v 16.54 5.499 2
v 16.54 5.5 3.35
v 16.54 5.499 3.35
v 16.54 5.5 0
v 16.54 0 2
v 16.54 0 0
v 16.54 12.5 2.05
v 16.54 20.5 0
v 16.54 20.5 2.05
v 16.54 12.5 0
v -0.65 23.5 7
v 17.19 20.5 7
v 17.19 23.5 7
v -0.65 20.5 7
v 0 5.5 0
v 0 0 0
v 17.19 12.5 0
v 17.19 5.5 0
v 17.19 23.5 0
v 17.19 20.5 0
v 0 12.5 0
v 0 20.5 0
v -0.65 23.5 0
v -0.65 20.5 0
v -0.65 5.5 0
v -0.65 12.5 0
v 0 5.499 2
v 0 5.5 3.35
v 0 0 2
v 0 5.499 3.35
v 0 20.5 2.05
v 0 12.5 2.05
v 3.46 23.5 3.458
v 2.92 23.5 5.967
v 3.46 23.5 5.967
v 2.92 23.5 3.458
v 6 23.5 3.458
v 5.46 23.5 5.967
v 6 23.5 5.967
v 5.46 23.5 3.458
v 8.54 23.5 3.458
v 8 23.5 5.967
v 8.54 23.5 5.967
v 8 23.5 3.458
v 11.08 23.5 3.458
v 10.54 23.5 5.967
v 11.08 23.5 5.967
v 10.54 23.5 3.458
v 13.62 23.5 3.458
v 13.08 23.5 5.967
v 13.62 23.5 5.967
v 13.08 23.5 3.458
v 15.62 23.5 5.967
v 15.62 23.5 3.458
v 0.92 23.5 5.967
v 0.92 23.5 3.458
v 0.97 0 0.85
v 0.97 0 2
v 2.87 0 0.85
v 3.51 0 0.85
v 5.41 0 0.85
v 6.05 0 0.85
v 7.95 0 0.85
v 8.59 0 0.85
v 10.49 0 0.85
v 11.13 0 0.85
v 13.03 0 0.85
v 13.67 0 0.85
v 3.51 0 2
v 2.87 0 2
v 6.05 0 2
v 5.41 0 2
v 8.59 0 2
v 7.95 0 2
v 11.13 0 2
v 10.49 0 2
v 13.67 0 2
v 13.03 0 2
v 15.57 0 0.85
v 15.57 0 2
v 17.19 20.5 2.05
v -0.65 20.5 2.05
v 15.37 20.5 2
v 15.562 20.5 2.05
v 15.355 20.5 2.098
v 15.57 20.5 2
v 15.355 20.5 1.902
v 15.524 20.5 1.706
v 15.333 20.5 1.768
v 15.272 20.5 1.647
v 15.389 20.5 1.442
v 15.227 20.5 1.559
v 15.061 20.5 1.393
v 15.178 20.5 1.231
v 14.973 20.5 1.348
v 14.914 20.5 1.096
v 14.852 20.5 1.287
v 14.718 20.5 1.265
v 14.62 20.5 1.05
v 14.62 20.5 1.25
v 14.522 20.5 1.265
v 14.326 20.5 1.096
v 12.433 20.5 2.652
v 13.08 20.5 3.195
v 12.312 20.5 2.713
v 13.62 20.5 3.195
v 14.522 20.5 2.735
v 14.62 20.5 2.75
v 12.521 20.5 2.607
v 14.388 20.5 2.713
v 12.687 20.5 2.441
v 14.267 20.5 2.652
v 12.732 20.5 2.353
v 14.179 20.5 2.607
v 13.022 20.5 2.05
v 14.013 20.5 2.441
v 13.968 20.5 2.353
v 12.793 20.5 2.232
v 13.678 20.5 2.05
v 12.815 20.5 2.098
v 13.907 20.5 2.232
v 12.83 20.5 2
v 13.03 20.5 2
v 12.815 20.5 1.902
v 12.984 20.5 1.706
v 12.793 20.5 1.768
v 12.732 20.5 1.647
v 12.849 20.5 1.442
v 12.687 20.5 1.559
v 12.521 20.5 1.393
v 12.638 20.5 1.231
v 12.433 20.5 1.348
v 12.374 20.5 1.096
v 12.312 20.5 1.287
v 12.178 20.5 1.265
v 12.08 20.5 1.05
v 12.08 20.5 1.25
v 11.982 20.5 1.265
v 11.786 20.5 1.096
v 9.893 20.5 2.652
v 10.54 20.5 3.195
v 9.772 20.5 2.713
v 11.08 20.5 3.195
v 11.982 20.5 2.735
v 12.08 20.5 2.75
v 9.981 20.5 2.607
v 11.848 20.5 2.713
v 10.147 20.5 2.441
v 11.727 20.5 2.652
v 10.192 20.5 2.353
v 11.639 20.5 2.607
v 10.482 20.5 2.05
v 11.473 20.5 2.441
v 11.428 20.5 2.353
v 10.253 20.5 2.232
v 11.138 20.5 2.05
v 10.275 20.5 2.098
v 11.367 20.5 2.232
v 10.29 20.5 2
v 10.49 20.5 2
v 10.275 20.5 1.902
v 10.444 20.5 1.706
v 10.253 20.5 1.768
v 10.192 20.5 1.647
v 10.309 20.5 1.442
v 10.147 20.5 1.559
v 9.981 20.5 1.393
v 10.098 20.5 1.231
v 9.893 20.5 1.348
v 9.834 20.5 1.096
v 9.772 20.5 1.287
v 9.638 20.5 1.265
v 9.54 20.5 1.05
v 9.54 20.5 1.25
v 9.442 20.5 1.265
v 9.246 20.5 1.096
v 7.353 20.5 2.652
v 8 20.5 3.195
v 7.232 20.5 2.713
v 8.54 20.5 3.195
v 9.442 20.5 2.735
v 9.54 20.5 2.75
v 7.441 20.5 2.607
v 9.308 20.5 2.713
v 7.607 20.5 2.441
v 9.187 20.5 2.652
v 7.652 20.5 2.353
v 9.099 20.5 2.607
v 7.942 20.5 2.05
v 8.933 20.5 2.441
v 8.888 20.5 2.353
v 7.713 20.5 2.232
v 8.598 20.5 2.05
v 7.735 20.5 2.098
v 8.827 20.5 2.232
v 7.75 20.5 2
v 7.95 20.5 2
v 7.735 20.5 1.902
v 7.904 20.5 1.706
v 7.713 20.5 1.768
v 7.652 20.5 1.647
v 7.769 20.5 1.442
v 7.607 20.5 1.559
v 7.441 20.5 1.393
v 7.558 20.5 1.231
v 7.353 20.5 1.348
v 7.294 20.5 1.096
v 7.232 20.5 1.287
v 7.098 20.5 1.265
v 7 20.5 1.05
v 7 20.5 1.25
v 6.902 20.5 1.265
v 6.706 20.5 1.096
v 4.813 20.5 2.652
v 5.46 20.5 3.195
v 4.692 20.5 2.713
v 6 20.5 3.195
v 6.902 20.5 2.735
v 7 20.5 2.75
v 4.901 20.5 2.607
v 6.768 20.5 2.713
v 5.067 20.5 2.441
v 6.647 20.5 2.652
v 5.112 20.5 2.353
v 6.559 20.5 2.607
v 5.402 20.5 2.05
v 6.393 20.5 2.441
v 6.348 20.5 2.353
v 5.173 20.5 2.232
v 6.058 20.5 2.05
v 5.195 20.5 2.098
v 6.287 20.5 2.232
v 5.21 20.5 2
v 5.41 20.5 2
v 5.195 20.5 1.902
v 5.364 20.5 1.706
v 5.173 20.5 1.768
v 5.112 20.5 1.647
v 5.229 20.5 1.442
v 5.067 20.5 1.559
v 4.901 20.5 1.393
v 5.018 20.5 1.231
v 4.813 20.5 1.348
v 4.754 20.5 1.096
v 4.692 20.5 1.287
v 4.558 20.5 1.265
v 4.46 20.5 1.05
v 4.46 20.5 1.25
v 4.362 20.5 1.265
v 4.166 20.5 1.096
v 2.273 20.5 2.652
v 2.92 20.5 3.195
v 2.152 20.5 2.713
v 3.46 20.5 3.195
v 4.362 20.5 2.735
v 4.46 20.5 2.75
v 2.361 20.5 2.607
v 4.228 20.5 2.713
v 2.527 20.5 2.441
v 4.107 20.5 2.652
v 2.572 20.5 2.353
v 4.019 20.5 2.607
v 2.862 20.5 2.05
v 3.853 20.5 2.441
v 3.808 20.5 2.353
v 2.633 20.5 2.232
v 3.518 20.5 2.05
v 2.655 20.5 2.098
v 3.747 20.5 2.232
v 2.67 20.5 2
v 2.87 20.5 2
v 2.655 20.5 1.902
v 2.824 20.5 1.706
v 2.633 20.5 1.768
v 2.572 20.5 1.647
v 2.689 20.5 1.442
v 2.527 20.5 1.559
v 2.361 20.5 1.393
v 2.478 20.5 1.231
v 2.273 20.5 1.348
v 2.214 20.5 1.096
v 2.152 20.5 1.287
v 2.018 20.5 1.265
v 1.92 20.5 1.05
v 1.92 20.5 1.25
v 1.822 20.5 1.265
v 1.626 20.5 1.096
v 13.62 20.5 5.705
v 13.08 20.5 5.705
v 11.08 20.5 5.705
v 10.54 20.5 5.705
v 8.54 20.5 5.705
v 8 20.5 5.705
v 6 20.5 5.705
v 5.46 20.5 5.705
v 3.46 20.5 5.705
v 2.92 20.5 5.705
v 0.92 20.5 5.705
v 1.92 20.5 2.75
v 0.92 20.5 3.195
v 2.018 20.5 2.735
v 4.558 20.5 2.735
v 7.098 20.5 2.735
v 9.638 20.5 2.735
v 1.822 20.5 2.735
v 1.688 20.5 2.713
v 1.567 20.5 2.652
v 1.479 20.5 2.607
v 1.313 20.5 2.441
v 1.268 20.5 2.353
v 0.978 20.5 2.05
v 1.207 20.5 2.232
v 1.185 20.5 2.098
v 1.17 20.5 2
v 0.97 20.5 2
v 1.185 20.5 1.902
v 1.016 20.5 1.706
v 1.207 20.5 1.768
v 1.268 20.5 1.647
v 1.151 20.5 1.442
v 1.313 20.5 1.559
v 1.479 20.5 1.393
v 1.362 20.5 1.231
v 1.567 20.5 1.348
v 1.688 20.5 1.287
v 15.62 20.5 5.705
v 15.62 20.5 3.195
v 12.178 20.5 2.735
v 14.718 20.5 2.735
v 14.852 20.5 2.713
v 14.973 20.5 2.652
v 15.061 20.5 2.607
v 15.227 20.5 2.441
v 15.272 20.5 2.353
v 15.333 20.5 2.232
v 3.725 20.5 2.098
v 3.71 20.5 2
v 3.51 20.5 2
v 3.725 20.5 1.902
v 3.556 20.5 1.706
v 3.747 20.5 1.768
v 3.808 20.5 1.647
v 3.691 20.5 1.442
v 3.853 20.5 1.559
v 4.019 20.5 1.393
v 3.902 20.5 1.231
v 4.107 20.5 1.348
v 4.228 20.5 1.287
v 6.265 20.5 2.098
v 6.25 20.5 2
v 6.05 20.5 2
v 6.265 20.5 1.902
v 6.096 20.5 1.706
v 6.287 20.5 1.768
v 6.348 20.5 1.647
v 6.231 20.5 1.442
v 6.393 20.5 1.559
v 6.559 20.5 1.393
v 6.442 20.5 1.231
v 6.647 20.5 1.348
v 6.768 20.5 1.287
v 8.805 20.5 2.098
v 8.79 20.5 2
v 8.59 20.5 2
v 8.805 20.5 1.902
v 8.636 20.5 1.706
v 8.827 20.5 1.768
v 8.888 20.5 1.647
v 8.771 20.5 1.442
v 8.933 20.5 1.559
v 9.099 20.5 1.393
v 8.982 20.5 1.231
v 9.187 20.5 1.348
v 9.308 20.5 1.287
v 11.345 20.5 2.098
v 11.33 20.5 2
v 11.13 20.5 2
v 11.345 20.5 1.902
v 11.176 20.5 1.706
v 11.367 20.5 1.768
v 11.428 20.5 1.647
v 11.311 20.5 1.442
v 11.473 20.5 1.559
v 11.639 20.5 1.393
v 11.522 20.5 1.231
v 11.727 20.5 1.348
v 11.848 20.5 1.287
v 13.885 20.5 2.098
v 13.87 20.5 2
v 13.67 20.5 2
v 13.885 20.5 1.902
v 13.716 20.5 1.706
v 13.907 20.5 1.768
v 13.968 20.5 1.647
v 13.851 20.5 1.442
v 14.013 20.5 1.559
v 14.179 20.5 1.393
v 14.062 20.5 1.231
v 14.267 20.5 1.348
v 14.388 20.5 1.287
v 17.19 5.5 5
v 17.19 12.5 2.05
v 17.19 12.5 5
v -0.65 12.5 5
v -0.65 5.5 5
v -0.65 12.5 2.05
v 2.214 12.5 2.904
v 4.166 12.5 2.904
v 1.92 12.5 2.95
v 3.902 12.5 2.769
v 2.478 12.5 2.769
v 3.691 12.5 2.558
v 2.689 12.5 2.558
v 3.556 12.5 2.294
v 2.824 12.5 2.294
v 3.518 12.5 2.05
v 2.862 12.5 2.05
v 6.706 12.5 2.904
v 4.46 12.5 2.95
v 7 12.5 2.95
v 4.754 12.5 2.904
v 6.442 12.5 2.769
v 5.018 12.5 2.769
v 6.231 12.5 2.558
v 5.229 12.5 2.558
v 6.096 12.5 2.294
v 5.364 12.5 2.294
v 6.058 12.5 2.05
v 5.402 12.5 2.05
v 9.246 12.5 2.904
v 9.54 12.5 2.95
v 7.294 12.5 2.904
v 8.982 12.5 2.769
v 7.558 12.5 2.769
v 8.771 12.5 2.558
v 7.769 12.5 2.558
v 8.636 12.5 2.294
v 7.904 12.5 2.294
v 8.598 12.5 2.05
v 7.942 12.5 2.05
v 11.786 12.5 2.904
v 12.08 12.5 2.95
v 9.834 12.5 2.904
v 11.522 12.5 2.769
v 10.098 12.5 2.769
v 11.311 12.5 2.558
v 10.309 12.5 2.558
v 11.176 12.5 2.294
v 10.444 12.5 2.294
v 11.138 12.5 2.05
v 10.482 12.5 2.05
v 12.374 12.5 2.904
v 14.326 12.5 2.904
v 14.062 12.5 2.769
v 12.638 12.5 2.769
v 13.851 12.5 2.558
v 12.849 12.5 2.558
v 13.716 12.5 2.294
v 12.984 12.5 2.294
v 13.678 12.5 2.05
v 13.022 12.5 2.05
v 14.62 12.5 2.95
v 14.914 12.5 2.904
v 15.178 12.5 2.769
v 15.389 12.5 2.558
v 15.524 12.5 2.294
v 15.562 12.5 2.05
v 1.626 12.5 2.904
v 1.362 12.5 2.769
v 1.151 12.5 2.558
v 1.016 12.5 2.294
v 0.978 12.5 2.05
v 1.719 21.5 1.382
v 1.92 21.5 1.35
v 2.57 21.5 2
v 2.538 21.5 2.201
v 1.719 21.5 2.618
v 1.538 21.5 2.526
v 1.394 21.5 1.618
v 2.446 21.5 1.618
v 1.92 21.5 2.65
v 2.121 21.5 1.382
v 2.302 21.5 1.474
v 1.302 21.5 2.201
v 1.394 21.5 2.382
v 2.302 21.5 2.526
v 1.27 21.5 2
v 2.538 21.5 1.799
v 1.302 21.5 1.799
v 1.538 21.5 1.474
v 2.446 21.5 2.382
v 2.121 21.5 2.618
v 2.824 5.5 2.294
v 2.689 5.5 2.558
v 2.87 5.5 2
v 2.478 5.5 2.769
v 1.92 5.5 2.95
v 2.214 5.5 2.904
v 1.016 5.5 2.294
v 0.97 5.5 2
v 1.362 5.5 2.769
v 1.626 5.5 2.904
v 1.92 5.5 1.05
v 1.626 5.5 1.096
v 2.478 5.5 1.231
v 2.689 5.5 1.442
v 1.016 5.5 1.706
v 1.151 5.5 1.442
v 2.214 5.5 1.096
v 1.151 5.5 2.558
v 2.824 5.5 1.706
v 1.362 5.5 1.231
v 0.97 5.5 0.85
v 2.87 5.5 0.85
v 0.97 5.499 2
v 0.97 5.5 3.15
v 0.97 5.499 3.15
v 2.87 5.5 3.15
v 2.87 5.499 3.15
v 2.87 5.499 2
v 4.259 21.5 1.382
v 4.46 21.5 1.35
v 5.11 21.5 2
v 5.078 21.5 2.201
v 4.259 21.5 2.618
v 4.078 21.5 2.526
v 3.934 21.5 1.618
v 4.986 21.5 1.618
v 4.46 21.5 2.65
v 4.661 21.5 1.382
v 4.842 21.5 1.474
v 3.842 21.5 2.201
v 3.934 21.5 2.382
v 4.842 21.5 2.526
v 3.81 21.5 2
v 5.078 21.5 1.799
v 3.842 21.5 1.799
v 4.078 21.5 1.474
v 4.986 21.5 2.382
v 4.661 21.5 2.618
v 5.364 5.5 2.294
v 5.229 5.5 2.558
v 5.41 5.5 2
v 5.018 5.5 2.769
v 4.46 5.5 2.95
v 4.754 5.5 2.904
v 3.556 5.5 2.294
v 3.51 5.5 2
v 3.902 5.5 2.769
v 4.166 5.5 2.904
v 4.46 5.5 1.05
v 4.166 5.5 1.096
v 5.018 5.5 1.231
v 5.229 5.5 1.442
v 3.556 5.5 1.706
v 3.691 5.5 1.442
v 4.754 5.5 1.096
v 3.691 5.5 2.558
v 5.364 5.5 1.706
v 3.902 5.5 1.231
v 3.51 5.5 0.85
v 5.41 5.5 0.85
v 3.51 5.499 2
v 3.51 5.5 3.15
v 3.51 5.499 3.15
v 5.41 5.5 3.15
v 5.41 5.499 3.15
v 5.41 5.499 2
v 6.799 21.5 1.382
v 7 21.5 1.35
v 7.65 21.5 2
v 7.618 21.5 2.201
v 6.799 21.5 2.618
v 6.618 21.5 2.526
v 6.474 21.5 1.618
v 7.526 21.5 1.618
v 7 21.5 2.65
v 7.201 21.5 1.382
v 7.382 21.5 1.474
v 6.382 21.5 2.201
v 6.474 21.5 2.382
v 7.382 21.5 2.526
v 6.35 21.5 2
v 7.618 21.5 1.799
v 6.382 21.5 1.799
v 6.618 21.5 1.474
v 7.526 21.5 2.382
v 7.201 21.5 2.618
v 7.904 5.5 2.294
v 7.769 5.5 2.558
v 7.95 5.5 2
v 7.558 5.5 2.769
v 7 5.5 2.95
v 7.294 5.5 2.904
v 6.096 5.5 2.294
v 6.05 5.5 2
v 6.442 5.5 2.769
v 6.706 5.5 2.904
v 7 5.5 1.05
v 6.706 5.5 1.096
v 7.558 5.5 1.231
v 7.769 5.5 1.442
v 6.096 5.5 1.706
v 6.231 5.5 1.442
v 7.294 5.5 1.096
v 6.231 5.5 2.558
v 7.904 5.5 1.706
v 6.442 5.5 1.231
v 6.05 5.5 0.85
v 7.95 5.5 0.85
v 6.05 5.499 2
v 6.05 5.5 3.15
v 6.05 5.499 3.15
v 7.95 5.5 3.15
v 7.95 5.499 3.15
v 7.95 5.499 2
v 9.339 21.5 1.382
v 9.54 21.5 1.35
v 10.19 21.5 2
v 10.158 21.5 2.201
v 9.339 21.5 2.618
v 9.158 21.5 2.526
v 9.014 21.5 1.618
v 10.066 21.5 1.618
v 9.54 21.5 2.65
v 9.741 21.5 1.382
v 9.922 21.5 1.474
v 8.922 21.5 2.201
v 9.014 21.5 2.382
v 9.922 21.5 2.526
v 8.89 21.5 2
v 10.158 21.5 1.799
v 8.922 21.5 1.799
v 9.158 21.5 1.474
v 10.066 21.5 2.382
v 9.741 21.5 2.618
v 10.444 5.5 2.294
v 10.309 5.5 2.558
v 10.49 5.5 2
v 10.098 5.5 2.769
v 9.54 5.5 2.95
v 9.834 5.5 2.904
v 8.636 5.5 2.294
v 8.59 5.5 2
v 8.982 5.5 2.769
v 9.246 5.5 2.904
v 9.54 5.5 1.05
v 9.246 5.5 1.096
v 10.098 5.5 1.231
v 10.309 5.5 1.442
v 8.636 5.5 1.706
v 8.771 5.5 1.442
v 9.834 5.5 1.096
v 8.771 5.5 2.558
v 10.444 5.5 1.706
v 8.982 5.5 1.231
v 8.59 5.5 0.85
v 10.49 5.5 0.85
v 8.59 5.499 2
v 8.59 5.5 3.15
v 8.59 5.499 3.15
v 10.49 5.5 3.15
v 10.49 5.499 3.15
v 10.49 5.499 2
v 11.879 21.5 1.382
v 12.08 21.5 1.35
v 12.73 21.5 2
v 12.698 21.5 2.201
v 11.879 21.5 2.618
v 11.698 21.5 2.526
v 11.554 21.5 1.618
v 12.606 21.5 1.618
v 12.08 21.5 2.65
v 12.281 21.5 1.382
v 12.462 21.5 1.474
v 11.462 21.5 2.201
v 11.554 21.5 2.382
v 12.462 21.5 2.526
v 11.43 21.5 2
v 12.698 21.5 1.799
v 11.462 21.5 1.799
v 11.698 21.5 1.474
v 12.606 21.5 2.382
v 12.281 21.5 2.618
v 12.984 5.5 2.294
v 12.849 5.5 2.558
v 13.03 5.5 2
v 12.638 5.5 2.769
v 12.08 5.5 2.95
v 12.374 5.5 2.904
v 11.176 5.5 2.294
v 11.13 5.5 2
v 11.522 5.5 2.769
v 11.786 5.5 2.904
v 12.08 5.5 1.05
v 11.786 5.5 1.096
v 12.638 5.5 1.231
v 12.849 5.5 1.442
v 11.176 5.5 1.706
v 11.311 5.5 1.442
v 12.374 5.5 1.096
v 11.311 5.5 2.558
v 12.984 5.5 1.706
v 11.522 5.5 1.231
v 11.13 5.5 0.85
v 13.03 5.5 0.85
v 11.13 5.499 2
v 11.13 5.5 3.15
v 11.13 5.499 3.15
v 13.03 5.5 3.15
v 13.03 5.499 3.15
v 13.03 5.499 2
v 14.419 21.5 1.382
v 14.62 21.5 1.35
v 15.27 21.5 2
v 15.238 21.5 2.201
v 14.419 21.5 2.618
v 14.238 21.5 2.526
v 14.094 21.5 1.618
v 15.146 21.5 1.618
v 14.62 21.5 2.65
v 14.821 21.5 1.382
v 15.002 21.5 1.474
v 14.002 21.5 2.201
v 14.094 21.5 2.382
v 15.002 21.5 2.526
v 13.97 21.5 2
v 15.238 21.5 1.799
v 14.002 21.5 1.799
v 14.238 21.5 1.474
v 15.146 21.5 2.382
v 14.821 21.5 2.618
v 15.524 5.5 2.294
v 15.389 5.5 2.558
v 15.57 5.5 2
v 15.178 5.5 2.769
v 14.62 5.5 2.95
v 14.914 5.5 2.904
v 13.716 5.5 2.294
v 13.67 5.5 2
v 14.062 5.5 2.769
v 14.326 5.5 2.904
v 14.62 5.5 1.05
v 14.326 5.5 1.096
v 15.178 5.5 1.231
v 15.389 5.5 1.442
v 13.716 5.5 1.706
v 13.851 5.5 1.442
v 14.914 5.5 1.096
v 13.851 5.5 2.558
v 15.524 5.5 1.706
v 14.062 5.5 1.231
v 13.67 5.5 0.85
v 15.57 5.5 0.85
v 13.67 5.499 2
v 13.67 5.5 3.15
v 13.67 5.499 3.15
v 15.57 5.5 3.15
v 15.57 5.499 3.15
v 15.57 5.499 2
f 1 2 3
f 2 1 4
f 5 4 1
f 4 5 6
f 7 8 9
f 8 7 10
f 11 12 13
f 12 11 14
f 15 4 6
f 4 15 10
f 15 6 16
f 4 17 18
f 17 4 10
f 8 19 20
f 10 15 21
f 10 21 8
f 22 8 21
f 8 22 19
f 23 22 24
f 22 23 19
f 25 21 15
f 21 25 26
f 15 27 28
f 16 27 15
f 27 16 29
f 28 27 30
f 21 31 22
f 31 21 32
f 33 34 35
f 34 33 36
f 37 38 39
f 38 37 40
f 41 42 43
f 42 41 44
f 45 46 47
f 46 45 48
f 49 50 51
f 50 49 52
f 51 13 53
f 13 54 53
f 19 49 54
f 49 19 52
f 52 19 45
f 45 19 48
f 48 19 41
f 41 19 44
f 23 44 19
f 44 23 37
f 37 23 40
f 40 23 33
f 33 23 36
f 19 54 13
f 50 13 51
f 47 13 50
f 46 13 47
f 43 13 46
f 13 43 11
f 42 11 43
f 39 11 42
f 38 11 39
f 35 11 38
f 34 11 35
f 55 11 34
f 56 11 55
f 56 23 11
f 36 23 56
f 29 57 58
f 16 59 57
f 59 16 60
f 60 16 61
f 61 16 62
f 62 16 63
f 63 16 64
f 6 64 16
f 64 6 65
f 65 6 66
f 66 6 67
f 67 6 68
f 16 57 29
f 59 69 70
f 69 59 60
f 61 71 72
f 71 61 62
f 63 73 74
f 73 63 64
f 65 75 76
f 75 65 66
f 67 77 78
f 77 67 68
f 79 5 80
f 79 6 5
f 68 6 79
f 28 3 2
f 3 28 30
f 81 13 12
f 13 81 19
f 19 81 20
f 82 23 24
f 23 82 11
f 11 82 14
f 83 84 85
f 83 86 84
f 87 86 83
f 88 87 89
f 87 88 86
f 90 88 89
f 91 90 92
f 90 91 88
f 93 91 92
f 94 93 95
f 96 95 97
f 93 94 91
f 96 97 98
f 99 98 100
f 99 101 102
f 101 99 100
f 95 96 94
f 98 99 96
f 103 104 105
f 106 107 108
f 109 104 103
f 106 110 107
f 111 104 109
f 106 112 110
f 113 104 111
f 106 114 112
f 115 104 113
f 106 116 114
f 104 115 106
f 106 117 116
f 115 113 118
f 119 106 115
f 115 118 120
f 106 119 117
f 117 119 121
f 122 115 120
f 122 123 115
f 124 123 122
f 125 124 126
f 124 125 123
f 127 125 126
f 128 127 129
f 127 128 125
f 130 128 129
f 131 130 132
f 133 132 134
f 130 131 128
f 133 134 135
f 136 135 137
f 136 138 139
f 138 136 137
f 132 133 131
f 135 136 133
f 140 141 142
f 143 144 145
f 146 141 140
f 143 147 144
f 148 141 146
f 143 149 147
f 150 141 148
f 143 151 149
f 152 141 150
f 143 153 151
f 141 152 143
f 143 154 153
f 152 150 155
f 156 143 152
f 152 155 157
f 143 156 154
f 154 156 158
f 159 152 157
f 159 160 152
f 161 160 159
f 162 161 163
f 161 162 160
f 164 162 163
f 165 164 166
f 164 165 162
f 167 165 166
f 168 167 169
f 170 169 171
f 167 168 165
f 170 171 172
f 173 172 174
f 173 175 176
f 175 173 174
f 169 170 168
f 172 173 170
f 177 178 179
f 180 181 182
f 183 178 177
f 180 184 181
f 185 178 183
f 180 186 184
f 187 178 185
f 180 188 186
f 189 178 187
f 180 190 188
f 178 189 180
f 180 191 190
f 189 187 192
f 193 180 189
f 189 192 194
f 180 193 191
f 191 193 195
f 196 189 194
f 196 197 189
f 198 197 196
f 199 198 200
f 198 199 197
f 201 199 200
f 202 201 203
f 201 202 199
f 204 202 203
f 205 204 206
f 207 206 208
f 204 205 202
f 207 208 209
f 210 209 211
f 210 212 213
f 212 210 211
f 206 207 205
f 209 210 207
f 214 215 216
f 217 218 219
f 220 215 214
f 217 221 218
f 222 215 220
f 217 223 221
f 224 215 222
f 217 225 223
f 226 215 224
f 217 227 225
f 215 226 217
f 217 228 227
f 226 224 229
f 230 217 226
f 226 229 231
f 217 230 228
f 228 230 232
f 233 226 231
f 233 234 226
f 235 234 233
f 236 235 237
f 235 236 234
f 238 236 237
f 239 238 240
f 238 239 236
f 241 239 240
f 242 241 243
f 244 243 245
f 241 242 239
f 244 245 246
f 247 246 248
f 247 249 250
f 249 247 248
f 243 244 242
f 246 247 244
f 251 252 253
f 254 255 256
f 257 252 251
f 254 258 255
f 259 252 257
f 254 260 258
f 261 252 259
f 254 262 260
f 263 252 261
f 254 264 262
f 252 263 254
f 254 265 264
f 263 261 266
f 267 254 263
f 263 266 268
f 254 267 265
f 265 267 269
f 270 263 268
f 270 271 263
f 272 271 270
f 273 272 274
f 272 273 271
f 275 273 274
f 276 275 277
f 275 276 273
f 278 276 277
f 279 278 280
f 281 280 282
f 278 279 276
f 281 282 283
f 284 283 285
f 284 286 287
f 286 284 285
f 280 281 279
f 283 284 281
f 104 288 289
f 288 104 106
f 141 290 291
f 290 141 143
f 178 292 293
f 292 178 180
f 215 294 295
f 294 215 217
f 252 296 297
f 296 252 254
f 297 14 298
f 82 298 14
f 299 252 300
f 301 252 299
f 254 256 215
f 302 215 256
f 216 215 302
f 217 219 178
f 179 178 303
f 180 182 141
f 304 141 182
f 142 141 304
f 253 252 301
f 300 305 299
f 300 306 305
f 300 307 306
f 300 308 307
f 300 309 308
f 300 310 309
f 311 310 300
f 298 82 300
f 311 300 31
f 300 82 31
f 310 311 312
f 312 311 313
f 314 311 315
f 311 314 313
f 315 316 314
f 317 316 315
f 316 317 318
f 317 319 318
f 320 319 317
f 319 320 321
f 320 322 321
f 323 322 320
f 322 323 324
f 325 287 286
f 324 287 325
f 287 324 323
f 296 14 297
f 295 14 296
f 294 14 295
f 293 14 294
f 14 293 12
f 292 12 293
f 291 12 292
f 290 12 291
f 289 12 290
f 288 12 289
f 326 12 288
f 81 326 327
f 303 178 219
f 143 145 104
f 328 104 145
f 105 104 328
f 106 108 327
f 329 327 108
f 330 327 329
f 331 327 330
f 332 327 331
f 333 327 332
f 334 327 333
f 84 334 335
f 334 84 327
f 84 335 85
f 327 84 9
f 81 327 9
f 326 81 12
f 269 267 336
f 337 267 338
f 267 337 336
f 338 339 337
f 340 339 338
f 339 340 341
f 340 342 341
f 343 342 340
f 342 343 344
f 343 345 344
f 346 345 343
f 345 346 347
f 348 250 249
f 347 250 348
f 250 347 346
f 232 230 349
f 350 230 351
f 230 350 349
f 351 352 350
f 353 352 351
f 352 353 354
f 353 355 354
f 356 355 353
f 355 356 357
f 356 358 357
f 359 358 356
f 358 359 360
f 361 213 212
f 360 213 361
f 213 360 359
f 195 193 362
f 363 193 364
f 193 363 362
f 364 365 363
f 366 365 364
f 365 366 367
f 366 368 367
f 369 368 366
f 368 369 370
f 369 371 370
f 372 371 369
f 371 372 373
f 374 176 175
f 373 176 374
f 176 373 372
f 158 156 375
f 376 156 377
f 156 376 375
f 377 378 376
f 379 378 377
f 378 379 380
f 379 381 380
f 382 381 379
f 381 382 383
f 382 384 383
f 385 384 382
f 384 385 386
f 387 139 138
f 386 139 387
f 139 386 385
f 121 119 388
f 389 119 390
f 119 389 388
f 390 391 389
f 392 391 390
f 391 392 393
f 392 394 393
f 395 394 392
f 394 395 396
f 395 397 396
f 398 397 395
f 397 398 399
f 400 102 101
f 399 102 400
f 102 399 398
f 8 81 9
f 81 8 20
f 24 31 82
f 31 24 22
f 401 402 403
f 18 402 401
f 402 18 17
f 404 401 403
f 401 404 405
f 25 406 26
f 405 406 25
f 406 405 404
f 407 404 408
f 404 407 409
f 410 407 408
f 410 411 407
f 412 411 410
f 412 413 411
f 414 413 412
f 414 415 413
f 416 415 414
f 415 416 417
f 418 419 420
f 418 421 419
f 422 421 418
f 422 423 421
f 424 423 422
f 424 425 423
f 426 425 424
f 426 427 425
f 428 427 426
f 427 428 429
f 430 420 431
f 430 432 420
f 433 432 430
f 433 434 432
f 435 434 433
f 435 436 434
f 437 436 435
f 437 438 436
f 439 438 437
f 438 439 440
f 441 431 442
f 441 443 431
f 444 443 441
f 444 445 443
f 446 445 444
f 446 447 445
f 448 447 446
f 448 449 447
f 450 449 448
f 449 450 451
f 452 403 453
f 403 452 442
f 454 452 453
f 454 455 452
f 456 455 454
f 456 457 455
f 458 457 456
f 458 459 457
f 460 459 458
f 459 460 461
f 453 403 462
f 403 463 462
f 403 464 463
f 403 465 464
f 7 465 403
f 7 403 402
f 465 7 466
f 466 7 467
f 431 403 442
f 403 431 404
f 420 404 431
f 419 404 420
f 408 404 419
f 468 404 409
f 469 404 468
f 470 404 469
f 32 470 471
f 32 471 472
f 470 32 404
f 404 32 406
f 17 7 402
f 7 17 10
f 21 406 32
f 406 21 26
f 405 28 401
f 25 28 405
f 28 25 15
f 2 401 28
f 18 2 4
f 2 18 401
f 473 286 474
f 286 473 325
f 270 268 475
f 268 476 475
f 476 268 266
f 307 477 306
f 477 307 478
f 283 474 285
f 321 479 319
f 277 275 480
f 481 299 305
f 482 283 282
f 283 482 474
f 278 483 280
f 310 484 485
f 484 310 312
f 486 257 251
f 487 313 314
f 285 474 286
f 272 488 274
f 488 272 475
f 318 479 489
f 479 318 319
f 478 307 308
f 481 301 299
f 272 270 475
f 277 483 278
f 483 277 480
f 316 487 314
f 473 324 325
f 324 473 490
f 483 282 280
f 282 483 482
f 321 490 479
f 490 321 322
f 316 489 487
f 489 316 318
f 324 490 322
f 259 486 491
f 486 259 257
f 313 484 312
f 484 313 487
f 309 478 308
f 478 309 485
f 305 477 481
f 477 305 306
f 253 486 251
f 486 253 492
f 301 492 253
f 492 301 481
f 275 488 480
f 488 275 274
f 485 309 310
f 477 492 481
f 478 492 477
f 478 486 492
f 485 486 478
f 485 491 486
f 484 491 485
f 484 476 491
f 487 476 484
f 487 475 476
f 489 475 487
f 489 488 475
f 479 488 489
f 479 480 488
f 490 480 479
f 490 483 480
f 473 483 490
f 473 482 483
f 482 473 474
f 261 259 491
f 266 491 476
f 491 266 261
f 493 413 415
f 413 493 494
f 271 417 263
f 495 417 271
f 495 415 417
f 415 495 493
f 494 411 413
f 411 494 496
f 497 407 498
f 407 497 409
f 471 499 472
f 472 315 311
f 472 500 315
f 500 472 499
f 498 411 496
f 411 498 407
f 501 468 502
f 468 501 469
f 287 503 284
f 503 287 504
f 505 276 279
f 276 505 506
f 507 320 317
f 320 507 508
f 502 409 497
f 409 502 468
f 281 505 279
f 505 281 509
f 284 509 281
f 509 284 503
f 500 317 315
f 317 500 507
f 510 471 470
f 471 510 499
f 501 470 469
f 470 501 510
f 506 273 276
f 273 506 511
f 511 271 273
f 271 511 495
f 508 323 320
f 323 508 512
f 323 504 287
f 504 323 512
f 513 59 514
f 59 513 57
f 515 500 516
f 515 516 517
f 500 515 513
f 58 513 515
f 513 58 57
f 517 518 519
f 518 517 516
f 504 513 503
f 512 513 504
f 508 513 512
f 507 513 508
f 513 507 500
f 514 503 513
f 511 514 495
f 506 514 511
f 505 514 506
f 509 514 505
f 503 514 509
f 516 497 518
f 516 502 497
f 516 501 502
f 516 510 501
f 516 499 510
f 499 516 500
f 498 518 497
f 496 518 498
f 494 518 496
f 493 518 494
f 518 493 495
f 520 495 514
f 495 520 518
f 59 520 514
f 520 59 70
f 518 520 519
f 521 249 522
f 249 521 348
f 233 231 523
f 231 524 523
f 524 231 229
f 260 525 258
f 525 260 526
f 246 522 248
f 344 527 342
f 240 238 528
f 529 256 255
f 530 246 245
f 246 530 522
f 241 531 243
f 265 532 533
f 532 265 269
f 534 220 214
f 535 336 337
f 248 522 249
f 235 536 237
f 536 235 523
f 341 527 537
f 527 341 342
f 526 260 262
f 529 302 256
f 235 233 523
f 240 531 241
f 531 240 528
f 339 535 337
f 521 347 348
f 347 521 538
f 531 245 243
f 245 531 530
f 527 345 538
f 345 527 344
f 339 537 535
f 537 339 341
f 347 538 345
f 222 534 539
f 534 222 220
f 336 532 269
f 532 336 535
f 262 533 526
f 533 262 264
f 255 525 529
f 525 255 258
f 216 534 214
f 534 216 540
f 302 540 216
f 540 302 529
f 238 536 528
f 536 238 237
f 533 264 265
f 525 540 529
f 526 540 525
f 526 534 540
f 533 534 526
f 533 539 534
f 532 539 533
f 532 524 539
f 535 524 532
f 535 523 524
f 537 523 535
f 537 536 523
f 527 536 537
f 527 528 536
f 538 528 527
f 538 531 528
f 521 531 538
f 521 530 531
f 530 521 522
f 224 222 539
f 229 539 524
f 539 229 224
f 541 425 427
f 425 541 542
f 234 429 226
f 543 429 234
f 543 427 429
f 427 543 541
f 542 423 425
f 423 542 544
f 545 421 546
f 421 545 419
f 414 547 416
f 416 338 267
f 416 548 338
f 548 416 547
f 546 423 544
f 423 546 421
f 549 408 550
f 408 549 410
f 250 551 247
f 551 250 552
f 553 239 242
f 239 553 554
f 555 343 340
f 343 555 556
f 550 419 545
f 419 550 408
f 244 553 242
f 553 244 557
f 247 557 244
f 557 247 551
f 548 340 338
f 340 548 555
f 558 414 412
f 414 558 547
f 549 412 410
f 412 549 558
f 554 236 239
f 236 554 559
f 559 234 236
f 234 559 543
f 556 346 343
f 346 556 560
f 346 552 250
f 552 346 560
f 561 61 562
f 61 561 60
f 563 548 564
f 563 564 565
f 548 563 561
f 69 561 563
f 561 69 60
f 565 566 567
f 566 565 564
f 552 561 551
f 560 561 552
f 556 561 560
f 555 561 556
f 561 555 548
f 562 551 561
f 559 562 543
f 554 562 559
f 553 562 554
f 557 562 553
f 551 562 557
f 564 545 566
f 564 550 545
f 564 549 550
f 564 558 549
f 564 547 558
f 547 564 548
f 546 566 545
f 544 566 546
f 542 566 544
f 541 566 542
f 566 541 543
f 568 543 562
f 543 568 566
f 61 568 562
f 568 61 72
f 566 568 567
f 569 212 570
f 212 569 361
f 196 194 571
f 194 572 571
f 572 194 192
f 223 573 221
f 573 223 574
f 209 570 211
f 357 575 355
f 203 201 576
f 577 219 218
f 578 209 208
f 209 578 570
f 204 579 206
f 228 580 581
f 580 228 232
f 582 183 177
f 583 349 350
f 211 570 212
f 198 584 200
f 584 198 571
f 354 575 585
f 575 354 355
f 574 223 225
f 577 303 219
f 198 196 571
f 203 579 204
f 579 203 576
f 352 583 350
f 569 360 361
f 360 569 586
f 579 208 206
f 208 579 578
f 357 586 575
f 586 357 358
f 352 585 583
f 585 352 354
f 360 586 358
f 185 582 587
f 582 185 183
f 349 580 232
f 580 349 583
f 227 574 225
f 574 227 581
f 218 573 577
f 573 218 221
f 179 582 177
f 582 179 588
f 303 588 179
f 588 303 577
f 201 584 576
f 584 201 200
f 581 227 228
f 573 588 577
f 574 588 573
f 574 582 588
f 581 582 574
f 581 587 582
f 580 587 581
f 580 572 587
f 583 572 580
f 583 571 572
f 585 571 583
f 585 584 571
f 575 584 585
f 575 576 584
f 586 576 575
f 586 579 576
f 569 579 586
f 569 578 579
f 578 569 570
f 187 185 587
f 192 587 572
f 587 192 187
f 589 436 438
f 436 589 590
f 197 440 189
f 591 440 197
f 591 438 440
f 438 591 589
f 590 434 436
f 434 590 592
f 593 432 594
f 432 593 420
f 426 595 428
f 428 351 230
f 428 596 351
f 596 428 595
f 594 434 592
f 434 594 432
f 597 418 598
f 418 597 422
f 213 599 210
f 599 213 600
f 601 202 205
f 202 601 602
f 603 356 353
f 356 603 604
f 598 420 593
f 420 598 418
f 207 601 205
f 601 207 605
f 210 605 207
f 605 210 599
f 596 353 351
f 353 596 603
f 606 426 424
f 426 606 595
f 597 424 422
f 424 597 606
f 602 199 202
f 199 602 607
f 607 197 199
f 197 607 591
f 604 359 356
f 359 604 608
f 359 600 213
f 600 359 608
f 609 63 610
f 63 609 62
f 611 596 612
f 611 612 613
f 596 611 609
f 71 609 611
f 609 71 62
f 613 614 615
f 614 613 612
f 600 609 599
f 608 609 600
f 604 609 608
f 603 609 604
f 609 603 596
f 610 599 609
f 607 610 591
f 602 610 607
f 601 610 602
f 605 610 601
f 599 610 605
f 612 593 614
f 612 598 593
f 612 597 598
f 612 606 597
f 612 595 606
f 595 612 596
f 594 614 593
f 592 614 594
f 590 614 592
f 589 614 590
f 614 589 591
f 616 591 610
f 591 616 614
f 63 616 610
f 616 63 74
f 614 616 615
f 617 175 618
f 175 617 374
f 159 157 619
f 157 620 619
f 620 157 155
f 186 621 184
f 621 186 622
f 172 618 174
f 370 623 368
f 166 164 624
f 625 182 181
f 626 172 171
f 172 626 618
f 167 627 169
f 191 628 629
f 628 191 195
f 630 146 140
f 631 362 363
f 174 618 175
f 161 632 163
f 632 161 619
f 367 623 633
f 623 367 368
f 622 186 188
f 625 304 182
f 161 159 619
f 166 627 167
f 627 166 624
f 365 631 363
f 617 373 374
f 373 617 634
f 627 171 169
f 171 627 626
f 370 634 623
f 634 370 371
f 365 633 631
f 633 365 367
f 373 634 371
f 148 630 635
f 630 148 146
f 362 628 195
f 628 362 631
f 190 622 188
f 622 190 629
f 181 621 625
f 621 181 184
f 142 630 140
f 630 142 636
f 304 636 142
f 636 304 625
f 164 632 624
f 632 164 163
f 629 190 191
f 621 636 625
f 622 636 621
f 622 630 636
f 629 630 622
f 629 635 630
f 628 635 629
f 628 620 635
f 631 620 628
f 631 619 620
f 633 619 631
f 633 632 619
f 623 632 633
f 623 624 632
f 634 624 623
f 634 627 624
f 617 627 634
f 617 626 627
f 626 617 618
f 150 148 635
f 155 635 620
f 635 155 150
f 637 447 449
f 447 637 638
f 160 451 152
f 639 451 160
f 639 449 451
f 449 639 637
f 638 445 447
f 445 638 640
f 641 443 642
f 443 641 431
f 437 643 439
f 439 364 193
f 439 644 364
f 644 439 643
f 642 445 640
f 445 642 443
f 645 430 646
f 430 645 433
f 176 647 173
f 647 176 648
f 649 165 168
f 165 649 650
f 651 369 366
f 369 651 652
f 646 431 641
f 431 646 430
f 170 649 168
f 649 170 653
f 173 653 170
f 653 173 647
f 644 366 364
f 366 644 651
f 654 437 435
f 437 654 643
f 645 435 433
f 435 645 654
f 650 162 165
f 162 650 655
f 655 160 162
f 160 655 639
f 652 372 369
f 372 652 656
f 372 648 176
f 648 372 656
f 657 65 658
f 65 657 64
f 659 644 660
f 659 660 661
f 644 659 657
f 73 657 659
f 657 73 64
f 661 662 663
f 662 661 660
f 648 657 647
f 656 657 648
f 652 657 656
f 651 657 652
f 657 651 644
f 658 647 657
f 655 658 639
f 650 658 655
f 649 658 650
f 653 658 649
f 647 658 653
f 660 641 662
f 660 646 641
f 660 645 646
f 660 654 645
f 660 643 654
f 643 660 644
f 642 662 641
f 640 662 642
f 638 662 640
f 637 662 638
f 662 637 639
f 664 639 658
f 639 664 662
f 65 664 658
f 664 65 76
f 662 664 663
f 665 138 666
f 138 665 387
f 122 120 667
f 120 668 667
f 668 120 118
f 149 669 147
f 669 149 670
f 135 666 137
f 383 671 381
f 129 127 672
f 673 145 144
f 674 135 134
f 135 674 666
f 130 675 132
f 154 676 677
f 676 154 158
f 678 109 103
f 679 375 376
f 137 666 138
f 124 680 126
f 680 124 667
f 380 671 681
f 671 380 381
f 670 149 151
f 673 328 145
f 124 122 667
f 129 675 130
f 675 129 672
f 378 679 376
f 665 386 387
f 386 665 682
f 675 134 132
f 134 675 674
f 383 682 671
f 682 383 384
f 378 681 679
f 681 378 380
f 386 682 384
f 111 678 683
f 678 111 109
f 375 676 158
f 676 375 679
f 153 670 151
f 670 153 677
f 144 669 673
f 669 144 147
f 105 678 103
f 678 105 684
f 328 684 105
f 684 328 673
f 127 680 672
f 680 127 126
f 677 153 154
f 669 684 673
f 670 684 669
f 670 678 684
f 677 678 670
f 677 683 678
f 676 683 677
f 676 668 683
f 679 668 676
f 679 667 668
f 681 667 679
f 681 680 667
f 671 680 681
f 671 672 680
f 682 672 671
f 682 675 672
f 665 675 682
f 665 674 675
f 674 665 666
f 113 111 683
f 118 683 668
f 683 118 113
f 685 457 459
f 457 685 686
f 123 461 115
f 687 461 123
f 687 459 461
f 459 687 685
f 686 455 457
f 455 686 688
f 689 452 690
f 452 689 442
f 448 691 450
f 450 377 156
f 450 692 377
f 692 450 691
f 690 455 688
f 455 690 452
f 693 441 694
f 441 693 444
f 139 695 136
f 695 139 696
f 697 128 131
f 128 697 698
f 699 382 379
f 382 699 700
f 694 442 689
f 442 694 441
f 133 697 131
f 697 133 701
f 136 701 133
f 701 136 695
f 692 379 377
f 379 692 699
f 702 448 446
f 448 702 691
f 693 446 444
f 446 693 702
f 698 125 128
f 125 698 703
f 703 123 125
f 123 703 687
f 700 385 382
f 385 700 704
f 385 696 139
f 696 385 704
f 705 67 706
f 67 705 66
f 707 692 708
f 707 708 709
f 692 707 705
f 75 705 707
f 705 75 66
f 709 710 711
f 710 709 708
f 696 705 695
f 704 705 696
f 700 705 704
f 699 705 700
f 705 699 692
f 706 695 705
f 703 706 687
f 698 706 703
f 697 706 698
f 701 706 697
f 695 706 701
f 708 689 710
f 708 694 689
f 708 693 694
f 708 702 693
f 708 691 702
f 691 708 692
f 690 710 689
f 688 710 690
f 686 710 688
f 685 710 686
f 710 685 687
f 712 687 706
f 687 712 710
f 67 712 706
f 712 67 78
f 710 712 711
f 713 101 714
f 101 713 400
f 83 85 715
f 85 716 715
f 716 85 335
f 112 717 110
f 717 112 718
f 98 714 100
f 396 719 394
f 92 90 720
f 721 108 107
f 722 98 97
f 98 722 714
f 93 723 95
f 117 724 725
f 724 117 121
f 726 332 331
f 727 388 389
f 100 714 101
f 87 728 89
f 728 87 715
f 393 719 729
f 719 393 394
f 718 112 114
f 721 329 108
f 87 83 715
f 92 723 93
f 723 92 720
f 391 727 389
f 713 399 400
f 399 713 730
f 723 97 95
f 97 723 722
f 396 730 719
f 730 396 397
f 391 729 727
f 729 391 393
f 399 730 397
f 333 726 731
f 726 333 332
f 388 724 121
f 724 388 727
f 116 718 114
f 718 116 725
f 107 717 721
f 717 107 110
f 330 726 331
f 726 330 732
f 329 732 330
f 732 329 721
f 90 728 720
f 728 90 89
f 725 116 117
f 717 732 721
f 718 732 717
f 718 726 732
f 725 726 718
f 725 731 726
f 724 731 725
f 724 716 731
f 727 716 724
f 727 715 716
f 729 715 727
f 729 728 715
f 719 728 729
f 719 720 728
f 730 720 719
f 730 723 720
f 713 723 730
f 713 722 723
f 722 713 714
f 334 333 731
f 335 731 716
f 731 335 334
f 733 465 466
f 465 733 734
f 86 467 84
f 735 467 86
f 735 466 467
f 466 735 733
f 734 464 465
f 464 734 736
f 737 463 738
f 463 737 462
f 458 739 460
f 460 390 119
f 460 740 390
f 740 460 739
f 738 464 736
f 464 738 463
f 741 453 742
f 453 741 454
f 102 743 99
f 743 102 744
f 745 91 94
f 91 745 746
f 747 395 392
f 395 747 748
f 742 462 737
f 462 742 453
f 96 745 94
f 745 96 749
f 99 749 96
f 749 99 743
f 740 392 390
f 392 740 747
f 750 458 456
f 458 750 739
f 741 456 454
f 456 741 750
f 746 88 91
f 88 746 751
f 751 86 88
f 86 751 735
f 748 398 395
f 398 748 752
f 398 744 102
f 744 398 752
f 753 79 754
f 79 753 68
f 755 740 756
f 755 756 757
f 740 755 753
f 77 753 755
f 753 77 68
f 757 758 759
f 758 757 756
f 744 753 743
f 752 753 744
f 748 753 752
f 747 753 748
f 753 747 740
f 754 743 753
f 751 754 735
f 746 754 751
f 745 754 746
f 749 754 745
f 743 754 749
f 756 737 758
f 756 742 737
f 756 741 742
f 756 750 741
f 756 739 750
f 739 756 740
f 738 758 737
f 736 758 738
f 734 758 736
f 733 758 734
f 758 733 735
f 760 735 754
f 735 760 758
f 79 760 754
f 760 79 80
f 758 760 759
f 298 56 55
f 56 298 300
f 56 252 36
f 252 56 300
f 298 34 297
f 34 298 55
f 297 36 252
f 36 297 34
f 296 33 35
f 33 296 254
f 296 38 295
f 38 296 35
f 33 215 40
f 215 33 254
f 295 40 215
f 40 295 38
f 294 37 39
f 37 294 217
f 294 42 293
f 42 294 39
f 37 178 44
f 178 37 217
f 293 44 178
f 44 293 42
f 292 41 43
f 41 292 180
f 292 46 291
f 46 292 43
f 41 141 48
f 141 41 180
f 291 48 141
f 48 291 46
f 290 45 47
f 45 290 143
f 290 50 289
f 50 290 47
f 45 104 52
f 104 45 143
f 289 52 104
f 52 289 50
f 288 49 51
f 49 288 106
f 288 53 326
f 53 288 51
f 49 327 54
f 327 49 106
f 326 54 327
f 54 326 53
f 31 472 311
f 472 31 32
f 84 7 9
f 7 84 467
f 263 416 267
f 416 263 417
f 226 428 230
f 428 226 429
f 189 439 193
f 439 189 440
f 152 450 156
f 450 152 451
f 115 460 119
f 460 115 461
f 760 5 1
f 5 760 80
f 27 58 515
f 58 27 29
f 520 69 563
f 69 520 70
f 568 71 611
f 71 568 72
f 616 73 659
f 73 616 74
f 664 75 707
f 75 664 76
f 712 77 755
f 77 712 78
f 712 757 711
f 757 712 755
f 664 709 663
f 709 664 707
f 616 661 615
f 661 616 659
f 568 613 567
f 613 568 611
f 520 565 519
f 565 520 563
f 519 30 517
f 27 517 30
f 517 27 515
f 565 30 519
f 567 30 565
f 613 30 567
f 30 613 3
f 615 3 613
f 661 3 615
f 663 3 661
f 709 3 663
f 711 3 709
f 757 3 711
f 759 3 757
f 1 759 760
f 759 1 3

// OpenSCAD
$fn=20;
/*
    Pogo Pin Serial Adaptor (Customisable)
    Author: Brian Khuu 2019

    This is similar to https://hackaday.com/2017/08/04/pogo-pin-serial-adapter-thing/
    But is fully 3D printed without need for PCB. This may be useful for Arduino serial adaptors.

    I used P75-E2 probes for this

    ```
    Specification:
    Model: P75-E2
    Full Stroke: 2.50mm
    Current: 3A
    Resistance: 50mΩ
    Spring Pressure: 100g
    Color: Gold+Silver
    Needle Diameter: approx. 1.3mm
    Shank Diameter: approx. 0.74mm
    Needle Length: approx. 16.5mm
    Needle Sheath Diameter: 1.32mm
    Drill Size: approx. 1.4mm
    Minimum Test Distance: approx. 1.91mm
    ```
*/

// Designed For Printer Nozzle
printer_nozzle=0.4;

// Base Thickness
base_thickness = 0.1;

/* probe pin spec */
ppext = 8; // Probe extention length
ppbody = 16; // Body of the probe
ppdia = 1.3; // probe pin diameter

ppdiatol = 0.6; // tolerance for fitting
ppinset = 2.5;

ppdiaoutset = ppext-ppinset; // How far to space out to allow for side fits
echo(ppdiaoutset);

/* Castellated Module Pin Spacing and count */

// Pin Count
ppc = 6;

// Pin Spacing
pps = 2.54;

// PCB Thickness
pcb_thickness = 1.1; // 1mm Open Log Clone

// PCB Probe Offset
pcb_probe_offset = 1.3;

/* Clip */
clip_tab = 5; // Clip tab to more easily open the clip

/* pcb */
pcb_h = 2; // pcb thickness

/* calc */
boxx = ppc * pps + ppdia;
boxy = 2 + ppbody + ppdiaoutset;
boxh = base_thickness+pcb_probe_offset+ppdiatol+5;

module probe_pin_req()
{
  inset=0;
  translate([0,0,-ppbody])
  union()
  {
    translate([0,0,0])
      cylinder(r1=(ppdia)/2,r2=(ppdia+ppdiatol)/2, h=3);
    translate([0,0,1])
      cylinder(r=(ppdia+ppdiatol)/2, h=ppbody+ppext+1);
    %color("gold") cylinder(r=ppdia/2, h=ppbody);
    %color("silver") translate([0,0,ppbody])
      cylinder(r=ppdia/2, r2=0, h=ppext);
  }
}

module openlog_clone_programmer_jig()
{
  difference()
  {  
    /* Bulk */
    union()
    {
      difference()
      {
        cube([boxx,boxy,boxh]);
        translate([-5, 0, base_thickness+pcb_probe_offset+ppdia*1.5]) 
          cube([ppc * pps+10,ppbody, 5]);
      }
      translate([-(ppdia)/2, ppdiaoutset+7+ppbody/2, 0]) 
        cube([boxx+(ppdia),boxy-(ppdiaoutset+7+ppbody/2), boxh]);
      translate([-(ppdia)/2, ppdiaoutset, 0]) 
        cube([boxx+(ppdia),7, 5]);
    }

    /* Probe Access Cutout */
    translate([-5, ppdiaoutset+7, base_thickness+pcb_probe_offset+ppdia/2]) 
      cube([ppc * pps+10,ppbody/2, boxh]);
      
    /* Module Cutout */
    translate([0, -0.001, base_thickness+ppdia+ppdiatol]) 
      cube([boxx,ppdiaoutset, boxh]);
      
    /* Probe */
    for ( xi = [0 : 1 : ppc-1] )
    {
      translate([ppdia/2+pps/2+pps*xi, 0, base_thickness])
      union()
      {
        translate([0, ppdiaoutset, pcb_probe_offset+ppdiatol])
          rotate([90,0,0])
          probe_pin_req();
        
        translate([0, ppdiaoutset, pcb_probe_offset+ppdiatol])
          rotate([180,0,0])
            translate([0, (ppdiaoutset)/2, 0])
              cube([ppdia+ppdiatol,(ppdiaoutset),ppdia+1], center=true);
      }
    }
    
    /* Wire Guide (To solder onto the probe) */
    for ( xii = [0 : 1 : ppc-1] )
    {
      translate([ppdia/2+pps/2+pps*xii, boxy+1, base_thickness+ppdia+1.5+pcb_probe_offset+ppdiatol])
        rotate([95,0,0])
          cube([2,2.5,20],center=true);
    }
  }
}

openlog_clone_programmer_jig();
